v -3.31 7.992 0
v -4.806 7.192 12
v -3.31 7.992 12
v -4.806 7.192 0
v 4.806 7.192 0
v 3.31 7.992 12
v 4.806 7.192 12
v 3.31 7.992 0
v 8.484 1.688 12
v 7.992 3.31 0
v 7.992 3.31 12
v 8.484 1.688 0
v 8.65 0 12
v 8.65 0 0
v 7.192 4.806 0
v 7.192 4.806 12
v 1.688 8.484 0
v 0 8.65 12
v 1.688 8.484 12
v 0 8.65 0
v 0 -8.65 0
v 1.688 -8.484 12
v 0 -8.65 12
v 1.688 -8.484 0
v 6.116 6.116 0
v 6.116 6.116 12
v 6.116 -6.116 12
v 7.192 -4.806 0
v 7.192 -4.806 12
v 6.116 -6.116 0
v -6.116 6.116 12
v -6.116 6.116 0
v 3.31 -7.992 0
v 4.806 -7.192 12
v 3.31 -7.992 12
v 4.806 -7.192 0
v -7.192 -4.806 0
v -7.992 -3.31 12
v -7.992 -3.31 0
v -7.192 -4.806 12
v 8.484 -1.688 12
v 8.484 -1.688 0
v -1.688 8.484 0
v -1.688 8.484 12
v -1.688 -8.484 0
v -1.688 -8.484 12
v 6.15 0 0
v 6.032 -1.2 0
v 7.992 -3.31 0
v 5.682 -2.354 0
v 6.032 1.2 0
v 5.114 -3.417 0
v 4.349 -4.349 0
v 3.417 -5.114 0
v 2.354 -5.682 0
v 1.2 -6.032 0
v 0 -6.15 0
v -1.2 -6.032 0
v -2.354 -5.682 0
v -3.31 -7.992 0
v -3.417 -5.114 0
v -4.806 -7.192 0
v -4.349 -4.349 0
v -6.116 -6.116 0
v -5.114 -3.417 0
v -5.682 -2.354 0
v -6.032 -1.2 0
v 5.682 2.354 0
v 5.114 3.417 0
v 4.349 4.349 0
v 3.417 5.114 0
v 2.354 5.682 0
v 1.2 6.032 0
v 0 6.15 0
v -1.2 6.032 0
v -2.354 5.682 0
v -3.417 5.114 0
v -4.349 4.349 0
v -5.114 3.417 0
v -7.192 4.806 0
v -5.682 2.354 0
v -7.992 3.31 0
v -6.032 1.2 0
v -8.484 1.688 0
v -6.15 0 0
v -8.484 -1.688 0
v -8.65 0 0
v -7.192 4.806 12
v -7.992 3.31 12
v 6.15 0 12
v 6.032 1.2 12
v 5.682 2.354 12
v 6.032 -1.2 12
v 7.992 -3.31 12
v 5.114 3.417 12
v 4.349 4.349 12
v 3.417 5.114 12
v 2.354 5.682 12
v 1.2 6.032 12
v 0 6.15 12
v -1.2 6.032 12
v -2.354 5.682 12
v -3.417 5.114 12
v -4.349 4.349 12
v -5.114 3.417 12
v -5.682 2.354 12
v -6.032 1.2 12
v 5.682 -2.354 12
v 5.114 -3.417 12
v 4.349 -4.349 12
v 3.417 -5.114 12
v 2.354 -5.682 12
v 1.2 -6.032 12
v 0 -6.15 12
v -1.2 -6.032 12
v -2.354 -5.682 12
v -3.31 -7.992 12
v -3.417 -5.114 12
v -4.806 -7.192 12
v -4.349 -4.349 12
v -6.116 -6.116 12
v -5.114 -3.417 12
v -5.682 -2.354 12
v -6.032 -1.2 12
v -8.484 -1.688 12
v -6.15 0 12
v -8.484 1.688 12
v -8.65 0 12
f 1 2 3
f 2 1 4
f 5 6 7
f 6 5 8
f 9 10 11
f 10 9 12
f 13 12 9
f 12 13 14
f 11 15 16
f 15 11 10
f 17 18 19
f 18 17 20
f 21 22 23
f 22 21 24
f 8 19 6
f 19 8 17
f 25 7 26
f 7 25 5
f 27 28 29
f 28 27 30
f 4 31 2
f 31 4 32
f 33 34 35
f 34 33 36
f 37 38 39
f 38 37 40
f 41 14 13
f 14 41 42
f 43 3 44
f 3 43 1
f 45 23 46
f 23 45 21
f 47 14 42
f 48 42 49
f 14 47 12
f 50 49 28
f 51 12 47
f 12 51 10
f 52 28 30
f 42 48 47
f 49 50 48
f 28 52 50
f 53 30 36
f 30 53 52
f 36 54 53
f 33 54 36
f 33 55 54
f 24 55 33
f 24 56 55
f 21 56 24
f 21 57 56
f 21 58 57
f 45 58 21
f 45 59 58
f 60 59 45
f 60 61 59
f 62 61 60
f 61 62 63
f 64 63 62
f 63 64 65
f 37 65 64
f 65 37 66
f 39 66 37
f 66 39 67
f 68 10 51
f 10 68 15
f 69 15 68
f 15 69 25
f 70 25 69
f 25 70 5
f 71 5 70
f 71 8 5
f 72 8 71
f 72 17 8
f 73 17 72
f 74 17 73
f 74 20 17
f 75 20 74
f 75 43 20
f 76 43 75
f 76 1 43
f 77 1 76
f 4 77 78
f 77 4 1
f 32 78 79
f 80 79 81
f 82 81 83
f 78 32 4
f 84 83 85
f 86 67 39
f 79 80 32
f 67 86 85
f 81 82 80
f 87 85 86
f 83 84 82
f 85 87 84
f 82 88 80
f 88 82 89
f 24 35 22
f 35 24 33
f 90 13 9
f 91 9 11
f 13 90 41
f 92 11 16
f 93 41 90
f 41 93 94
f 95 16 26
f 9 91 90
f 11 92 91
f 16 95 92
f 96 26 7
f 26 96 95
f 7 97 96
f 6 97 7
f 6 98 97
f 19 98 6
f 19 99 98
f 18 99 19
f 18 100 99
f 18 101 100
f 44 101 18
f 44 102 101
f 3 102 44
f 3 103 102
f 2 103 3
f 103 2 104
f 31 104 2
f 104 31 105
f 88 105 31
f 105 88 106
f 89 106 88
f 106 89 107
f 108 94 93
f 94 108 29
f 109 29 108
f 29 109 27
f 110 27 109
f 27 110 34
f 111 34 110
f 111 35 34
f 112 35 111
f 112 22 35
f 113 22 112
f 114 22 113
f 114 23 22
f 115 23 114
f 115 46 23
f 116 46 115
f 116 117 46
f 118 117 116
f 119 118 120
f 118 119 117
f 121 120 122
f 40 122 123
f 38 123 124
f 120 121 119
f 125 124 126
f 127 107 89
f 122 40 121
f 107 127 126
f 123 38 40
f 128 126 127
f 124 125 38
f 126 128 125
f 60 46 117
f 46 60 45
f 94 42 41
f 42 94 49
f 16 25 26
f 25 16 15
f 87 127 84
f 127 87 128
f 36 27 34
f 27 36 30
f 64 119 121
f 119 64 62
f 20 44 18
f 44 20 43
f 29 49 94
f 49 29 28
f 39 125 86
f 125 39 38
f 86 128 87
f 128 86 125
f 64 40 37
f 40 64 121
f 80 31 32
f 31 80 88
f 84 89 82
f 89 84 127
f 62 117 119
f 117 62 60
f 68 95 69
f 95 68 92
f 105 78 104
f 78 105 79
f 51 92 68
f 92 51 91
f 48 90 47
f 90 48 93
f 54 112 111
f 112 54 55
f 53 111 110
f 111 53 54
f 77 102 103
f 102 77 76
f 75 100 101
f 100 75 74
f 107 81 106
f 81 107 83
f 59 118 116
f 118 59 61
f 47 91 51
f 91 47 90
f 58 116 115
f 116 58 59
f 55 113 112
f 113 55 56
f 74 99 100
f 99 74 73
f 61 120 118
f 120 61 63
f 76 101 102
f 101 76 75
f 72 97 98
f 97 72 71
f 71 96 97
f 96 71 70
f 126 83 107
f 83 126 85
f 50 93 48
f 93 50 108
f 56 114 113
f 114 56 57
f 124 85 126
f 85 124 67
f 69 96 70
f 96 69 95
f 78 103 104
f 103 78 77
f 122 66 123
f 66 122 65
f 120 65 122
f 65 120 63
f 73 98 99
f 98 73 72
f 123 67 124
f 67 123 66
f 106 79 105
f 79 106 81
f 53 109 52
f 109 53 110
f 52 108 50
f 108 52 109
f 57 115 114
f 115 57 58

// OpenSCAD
$fn = 32;

// ----------------------------------------------------------------------
// Spacer sleeve: 17.3 / 12.3 x 12 mm
// ----------------------------------------------------------------------

// --- parameters (mm) ---
tube_d = 17.3;            // outside diameter
bore_d = 12.3;            // shaft bore
tube_l = 12;              // sleeve length

module sleeve() {
  cylinder(h = tube_l, d = tube_d);
}

difference() {
  sleeve();
  translate([0, 0, -1]) cylinder(h = tube_l + 2, d = bore_d);
}
